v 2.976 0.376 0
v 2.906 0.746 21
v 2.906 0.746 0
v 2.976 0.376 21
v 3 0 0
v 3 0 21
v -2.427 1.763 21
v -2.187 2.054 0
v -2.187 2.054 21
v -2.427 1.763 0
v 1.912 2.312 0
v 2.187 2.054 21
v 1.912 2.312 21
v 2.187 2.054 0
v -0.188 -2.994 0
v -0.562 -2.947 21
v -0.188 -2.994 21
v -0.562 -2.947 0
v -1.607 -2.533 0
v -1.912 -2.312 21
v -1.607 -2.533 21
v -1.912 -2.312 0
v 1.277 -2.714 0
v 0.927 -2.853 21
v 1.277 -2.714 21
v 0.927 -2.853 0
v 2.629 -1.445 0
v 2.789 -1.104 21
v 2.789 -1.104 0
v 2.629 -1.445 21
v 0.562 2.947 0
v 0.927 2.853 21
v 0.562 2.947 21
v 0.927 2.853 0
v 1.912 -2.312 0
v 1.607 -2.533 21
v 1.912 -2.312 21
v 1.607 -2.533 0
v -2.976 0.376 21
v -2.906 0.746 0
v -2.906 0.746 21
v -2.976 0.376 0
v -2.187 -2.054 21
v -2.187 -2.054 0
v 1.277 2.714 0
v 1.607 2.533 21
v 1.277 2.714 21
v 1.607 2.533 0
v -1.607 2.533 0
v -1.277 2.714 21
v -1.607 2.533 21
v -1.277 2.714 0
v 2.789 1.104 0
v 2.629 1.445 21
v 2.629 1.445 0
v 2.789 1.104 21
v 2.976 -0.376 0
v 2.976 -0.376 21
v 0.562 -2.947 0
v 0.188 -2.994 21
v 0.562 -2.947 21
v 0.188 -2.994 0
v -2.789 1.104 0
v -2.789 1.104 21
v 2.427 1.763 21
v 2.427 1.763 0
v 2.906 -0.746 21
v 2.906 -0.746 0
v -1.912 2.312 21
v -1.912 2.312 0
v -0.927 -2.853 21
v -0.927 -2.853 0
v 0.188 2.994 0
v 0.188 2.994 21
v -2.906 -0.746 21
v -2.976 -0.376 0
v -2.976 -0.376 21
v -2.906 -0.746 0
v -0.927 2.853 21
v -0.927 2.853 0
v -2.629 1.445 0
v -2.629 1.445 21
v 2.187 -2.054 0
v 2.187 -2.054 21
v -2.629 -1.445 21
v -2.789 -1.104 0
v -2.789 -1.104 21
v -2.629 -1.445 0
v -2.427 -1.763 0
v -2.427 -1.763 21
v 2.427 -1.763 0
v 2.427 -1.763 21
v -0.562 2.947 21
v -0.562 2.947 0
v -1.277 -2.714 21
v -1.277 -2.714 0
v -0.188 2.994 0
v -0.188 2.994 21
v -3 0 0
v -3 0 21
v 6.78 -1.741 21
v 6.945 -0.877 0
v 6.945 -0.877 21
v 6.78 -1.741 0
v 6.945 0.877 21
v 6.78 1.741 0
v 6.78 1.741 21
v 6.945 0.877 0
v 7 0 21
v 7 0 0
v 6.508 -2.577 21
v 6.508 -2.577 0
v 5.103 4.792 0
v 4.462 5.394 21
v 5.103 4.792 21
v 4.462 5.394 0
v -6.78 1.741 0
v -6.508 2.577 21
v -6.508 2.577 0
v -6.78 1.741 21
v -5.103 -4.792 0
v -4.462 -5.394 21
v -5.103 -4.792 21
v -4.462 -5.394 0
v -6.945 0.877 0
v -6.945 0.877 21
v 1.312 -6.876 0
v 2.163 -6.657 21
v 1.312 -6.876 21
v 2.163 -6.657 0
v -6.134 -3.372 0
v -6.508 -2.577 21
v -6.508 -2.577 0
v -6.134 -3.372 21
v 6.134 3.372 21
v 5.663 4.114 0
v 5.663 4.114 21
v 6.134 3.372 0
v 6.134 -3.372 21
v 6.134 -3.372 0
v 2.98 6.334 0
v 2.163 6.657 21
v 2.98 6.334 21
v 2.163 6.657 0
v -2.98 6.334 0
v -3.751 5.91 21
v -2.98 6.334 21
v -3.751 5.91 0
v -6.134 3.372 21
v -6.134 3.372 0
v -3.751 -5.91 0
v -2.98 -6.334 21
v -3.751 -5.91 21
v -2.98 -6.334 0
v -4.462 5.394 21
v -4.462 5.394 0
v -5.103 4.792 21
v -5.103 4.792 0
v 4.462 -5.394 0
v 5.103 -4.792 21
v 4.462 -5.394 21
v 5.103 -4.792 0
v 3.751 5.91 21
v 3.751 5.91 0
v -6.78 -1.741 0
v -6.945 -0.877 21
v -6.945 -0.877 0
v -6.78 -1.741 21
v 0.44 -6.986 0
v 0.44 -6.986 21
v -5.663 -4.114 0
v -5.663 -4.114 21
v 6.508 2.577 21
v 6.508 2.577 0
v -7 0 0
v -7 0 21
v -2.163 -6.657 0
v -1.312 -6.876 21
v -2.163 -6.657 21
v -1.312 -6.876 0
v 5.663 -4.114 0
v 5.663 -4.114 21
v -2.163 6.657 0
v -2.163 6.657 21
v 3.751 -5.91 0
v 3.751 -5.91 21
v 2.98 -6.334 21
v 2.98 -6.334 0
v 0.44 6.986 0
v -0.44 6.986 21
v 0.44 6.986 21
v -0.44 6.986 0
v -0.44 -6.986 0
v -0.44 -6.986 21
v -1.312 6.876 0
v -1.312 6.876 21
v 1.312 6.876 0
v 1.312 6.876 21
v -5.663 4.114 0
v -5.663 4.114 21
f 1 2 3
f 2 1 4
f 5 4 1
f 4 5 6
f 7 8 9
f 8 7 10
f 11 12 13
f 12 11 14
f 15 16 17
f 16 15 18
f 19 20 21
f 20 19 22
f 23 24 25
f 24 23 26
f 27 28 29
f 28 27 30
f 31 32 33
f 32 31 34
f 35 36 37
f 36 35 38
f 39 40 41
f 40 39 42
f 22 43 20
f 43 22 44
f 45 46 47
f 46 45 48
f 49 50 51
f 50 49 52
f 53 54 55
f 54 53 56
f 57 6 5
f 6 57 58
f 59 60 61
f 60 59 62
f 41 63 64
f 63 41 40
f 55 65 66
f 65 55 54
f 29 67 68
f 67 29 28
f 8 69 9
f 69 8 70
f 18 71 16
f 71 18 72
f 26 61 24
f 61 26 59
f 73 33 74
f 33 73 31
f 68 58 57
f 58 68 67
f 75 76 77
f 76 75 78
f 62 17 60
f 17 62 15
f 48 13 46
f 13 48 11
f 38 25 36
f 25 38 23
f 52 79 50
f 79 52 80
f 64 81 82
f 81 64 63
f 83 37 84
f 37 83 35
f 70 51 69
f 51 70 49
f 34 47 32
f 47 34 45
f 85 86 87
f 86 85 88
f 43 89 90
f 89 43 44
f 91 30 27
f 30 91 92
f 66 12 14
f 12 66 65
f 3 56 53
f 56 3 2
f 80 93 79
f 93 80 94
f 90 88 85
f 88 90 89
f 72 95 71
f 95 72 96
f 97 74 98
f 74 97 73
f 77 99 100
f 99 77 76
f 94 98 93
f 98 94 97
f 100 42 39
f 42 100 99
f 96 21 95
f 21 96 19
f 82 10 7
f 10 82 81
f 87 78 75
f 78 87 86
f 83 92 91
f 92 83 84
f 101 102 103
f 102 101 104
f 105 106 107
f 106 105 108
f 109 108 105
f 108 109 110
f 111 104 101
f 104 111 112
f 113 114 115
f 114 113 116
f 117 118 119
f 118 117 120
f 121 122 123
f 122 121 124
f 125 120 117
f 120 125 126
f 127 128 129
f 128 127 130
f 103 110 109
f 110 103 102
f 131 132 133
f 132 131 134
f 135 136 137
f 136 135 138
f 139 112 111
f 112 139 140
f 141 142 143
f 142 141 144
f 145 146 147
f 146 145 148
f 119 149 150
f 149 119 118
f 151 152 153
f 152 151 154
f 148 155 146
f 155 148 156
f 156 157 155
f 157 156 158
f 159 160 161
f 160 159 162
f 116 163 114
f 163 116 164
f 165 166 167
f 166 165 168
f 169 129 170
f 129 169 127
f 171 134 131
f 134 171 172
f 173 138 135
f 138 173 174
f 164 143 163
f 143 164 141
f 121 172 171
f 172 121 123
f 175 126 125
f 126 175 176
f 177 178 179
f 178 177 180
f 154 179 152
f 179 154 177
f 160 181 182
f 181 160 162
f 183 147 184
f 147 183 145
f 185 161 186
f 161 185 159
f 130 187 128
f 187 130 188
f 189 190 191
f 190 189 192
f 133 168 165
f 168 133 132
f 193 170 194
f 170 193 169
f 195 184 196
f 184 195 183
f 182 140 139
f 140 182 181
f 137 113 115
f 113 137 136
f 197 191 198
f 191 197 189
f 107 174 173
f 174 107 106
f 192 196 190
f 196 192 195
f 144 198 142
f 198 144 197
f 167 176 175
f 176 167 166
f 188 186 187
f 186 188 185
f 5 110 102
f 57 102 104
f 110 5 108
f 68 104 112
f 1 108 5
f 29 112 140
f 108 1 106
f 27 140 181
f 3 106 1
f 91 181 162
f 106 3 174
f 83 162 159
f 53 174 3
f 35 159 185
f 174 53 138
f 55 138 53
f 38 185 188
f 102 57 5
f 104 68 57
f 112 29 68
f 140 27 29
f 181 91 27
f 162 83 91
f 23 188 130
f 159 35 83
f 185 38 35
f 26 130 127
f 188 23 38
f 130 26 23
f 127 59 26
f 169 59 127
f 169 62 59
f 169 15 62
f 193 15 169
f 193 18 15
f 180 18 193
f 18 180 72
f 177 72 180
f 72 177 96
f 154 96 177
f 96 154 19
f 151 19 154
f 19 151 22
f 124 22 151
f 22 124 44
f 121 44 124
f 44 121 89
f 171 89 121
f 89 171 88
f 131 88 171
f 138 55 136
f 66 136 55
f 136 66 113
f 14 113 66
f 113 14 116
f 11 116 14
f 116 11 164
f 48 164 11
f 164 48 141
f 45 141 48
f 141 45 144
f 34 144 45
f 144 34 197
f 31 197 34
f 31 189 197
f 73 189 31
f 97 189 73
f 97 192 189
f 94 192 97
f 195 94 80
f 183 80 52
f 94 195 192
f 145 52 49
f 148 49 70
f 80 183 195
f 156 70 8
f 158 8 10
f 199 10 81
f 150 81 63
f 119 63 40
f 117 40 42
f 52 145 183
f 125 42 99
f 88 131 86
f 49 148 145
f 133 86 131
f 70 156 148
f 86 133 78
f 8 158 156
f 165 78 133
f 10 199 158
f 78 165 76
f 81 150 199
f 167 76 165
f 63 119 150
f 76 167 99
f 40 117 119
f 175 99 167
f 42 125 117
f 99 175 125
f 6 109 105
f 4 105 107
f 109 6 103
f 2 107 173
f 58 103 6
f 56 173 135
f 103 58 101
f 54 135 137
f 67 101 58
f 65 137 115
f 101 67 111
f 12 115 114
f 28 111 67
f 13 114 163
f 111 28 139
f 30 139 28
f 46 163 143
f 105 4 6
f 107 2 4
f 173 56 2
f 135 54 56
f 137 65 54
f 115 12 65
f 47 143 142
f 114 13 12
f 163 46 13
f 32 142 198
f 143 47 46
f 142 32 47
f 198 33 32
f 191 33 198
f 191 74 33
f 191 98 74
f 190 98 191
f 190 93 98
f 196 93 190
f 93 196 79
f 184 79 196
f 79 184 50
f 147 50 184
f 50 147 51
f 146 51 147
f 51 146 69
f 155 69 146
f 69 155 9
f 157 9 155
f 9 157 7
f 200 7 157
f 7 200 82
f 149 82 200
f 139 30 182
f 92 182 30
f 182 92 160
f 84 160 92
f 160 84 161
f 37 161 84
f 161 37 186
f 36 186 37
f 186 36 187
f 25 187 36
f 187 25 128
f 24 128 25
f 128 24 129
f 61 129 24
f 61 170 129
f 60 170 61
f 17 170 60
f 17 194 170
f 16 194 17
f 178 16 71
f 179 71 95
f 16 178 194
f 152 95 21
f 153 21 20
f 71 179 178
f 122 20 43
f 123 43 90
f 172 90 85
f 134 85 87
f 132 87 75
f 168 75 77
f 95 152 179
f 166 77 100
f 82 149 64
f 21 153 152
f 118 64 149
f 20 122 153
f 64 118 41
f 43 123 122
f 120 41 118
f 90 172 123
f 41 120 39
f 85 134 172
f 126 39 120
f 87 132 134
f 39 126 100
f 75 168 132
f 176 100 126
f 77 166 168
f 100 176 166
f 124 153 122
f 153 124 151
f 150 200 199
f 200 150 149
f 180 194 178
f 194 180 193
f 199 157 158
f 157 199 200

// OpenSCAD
$fn = 50;


difference() {
	union() {
		*color(alpha = 1.0000000000, c = "gray") {
			translate(v = [0, 7, 0]) {
				linear_extrude(height = 1) {
					text(font = "Arial:style=Bold", halign = "center", size = 4.5000000000, text = "COMMENT plate main", valign = "center");
				}
			}
		}
		*color(alpha = 1.0000000000, c = "gray") {
			translate(v = [0, 14, 0]) {
				linear_extrude(height = 1) {
					text(font = "Arial:style=Bold", halign = "center", size = 4.5000000000, text = "COMMENT description oobb_plate_shape_p_type_21_depth_1_width_1_height_21_thickness_true_both_holes", valign = "center");
				}
			}
		}
		cylinder(h = 21, r = 7.0000000000);
	}
	union() {
		*color(alpha = 1.0000000000, c = "gray") {
			translate(v = [0, 7, 0]) {
				linear_extrude(height = 1) {
					text(font = "Arial:style=Bold", halign = "center", size = 4.5000000000, text = "COMMENT holes main", valign = "center");
				}
			}
		}
		*color(alpha = 1.0000000000, c = "gray") {
			translate(v = [0, 14, 0]) {
				linear_extrude(height = 1) {
					text(font = "Arial:style=Bold", halign = "center", size = 4.5000000000, text = "COMMENT description oobb_holes_shape_n_type_1_width_1_height_21_thickness_true_both_holes", valign = "center");
				}
			}
		}
		translate(v = [0, 0, -50]) {
			cylinder(h = 100, r = 3.0000000000);
		}
		translate(v = [0, 0, -50]) {
			cylinder(h = 100, r = 1.5000000000);
		}
	}
}
